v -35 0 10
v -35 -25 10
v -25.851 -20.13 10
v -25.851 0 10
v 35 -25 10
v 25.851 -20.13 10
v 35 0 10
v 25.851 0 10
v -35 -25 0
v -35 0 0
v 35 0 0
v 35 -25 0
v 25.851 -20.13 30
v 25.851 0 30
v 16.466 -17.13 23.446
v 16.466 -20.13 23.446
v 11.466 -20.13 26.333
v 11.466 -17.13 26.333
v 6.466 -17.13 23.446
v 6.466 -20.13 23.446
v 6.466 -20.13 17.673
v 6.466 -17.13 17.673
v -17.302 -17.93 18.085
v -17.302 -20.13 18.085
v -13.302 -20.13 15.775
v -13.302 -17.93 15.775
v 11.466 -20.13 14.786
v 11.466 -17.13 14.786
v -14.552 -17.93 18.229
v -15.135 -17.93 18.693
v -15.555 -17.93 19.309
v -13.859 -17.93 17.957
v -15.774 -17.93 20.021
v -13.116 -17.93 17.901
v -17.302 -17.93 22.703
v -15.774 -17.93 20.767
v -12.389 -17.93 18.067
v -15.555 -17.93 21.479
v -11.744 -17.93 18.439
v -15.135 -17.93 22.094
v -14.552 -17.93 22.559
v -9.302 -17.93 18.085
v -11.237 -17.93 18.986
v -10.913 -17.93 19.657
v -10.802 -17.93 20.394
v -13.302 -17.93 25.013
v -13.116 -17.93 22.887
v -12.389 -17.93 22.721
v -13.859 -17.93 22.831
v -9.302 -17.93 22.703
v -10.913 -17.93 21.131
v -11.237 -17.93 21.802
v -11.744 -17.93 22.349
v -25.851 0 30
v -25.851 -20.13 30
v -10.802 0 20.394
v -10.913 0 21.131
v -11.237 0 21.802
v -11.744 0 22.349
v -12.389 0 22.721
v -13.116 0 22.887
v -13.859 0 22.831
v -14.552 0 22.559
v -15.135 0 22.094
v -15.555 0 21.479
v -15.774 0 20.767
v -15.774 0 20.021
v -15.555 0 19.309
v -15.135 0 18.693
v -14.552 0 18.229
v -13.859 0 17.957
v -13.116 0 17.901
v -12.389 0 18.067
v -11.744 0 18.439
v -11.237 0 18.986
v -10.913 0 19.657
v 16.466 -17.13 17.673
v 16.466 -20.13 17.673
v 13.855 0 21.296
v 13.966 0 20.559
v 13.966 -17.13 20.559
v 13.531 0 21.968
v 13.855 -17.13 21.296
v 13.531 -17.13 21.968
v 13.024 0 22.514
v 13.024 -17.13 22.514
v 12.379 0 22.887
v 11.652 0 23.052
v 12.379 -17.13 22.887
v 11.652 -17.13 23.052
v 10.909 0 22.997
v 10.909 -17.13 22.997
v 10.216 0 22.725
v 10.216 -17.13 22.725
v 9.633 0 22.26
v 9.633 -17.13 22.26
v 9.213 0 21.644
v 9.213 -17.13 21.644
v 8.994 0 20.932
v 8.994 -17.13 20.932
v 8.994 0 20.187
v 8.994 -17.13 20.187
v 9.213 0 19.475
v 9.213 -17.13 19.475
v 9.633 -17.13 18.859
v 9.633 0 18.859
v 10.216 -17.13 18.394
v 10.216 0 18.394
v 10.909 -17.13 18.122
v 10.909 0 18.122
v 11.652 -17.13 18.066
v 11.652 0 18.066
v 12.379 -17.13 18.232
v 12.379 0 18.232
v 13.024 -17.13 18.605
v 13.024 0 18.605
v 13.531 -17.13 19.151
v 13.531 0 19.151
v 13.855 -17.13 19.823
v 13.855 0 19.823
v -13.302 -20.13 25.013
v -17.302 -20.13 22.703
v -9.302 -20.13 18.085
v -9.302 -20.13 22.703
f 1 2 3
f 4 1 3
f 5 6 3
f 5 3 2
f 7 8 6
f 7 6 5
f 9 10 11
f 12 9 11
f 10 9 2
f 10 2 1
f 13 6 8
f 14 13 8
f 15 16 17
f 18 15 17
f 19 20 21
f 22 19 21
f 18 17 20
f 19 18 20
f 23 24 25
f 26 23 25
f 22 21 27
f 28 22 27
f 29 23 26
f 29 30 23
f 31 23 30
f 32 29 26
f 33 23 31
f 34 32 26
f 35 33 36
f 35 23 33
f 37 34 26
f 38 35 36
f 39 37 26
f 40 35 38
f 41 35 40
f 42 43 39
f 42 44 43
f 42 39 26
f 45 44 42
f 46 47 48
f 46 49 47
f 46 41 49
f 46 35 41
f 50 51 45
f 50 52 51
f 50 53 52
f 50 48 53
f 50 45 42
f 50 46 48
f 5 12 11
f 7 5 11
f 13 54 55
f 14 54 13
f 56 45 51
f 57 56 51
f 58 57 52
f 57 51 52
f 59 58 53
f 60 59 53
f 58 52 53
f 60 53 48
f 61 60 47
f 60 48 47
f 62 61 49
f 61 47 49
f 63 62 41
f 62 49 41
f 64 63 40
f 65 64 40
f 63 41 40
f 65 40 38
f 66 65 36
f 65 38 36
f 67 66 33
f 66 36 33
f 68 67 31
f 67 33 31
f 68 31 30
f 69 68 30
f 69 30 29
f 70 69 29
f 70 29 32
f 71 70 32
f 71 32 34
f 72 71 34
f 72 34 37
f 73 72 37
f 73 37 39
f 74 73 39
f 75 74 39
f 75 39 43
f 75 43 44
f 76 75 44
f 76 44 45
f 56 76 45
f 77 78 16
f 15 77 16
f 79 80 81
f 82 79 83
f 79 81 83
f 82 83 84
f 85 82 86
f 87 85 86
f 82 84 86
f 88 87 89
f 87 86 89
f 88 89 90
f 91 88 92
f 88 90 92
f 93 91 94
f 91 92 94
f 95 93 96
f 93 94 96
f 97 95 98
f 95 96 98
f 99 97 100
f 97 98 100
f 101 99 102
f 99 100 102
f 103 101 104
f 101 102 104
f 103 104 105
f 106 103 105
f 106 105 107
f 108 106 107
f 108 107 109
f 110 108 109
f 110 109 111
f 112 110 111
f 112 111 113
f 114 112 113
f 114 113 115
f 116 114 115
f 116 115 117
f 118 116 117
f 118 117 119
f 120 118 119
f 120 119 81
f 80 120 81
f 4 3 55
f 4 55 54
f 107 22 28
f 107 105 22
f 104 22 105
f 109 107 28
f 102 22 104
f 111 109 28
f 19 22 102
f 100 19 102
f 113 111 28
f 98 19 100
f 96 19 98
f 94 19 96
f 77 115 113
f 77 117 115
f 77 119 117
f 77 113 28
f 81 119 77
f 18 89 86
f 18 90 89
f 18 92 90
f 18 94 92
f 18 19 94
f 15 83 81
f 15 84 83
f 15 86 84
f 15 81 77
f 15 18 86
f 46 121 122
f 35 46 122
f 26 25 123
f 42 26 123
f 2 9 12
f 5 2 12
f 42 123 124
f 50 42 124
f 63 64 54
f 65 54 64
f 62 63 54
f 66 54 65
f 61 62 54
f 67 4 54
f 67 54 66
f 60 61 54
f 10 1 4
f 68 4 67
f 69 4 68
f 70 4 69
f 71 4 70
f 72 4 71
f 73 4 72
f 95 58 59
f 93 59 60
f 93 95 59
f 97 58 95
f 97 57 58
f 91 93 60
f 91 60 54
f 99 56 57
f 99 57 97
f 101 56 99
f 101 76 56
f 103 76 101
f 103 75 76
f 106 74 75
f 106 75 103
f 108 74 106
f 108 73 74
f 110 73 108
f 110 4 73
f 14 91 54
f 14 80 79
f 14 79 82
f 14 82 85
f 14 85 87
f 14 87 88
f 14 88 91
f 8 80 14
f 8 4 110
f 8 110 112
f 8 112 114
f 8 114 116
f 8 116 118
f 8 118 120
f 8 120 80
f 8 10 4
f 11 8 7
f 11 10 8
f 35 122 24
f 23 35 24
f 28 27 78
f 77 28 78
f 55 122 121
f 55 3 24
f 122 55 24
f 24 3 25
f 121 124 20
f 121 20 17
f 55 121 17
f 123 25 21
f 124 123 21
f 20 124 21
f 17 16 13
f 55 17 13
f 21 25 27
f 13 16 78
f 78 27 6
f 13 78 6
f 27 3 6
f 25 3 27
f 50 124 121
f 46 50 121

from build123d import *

# Parameters (mm, degrees)
F0_W      = 70
F0_H      = 50
F1_DEPTH  = 10
F2_W      = 51.701616
F2_H      = 40.25942
F3_DEPTH  = 20
F5_DEPTH  = 2.2
F6_R      = 2.5
F7_DEPTH  = 42.93071
F9_DEPTH  = 3
F10_R     = 2.5
F11_DEPTH = 42.13071
F12_W     = 101.047278
F12_H     = 53.498119
F13_DEPTH = 30.001


with BuildPart() as f1:
    # F0 (on Top) → F1 (new body)
    with BuildSketch(Plane.XY):
        Rectangle(F0_W, F0_H)
    extrude(amount=F1_DEPTH)

    # F2 (on face) → F3 (join)
    with BuildSketch(Plane.XY.offset(10)):
        Rectangle(F2_W, F2_H)
    extrude(amount=F3_DEPTH)

    # F4 (on face) → F5 (cut)
    with BuildSketch(Plane.XZ.offset(20.12971)):
        Polygon((-9.302341, 18.084529), (-9.302341, 22.703331), (-13.302341, 25.012733), (-17.302341, 22.703331), (-17.302341, 18.084529), (-13.302341, 15.775128), align=None)
    extrude(amount=-F5_DEPTH, mode=Mode.SUBTRACT)

    # F6 (on face) → F7 (cut, through all)
    with BuildSketch(Plane.XZ.offset(17.92971)):
        with Locations((-13.302341, 20.39393)):
            Circle(F6_R)
    extrude(amount=-F7_DEPTH, mode=Mode.SUBTRACT)

    # F8 (on face) → F9 (cut)
    with BuildSketch(Plane.XZ.offset(20.12971)):
        Polygon((16.465587, 17.672712), (16.465587, 23.446215), (11.465587, 26.332966), (6.465587, 23.446215), (6.465587, 17.672712), (11.465587, 14.785961), align=None)
    extrude(amount=-F9_DEPTH, mode=Mode.SUBTRACT)

    # F10 (on face) → F11 (cut, through all)
    with BuildSketch(Plane.XZ.offset(17.12971)):
        with Locations((11.465587, 20.559464)):
            Circle(F10_R)
    extrude(amount=-F11_DEPTH, mode=Mode.SUBTRACT)

    # F12 (on Top) → F13 (cut, through all)
    with BuildSketch(Plane.XY):
        with Locations((0, 26.749059)):
            Rectangle(F12_W, F12_H)
    extrude(amount=F13_DEPTH, mode=Mode.SUBTRACT)


solid = f1.part
